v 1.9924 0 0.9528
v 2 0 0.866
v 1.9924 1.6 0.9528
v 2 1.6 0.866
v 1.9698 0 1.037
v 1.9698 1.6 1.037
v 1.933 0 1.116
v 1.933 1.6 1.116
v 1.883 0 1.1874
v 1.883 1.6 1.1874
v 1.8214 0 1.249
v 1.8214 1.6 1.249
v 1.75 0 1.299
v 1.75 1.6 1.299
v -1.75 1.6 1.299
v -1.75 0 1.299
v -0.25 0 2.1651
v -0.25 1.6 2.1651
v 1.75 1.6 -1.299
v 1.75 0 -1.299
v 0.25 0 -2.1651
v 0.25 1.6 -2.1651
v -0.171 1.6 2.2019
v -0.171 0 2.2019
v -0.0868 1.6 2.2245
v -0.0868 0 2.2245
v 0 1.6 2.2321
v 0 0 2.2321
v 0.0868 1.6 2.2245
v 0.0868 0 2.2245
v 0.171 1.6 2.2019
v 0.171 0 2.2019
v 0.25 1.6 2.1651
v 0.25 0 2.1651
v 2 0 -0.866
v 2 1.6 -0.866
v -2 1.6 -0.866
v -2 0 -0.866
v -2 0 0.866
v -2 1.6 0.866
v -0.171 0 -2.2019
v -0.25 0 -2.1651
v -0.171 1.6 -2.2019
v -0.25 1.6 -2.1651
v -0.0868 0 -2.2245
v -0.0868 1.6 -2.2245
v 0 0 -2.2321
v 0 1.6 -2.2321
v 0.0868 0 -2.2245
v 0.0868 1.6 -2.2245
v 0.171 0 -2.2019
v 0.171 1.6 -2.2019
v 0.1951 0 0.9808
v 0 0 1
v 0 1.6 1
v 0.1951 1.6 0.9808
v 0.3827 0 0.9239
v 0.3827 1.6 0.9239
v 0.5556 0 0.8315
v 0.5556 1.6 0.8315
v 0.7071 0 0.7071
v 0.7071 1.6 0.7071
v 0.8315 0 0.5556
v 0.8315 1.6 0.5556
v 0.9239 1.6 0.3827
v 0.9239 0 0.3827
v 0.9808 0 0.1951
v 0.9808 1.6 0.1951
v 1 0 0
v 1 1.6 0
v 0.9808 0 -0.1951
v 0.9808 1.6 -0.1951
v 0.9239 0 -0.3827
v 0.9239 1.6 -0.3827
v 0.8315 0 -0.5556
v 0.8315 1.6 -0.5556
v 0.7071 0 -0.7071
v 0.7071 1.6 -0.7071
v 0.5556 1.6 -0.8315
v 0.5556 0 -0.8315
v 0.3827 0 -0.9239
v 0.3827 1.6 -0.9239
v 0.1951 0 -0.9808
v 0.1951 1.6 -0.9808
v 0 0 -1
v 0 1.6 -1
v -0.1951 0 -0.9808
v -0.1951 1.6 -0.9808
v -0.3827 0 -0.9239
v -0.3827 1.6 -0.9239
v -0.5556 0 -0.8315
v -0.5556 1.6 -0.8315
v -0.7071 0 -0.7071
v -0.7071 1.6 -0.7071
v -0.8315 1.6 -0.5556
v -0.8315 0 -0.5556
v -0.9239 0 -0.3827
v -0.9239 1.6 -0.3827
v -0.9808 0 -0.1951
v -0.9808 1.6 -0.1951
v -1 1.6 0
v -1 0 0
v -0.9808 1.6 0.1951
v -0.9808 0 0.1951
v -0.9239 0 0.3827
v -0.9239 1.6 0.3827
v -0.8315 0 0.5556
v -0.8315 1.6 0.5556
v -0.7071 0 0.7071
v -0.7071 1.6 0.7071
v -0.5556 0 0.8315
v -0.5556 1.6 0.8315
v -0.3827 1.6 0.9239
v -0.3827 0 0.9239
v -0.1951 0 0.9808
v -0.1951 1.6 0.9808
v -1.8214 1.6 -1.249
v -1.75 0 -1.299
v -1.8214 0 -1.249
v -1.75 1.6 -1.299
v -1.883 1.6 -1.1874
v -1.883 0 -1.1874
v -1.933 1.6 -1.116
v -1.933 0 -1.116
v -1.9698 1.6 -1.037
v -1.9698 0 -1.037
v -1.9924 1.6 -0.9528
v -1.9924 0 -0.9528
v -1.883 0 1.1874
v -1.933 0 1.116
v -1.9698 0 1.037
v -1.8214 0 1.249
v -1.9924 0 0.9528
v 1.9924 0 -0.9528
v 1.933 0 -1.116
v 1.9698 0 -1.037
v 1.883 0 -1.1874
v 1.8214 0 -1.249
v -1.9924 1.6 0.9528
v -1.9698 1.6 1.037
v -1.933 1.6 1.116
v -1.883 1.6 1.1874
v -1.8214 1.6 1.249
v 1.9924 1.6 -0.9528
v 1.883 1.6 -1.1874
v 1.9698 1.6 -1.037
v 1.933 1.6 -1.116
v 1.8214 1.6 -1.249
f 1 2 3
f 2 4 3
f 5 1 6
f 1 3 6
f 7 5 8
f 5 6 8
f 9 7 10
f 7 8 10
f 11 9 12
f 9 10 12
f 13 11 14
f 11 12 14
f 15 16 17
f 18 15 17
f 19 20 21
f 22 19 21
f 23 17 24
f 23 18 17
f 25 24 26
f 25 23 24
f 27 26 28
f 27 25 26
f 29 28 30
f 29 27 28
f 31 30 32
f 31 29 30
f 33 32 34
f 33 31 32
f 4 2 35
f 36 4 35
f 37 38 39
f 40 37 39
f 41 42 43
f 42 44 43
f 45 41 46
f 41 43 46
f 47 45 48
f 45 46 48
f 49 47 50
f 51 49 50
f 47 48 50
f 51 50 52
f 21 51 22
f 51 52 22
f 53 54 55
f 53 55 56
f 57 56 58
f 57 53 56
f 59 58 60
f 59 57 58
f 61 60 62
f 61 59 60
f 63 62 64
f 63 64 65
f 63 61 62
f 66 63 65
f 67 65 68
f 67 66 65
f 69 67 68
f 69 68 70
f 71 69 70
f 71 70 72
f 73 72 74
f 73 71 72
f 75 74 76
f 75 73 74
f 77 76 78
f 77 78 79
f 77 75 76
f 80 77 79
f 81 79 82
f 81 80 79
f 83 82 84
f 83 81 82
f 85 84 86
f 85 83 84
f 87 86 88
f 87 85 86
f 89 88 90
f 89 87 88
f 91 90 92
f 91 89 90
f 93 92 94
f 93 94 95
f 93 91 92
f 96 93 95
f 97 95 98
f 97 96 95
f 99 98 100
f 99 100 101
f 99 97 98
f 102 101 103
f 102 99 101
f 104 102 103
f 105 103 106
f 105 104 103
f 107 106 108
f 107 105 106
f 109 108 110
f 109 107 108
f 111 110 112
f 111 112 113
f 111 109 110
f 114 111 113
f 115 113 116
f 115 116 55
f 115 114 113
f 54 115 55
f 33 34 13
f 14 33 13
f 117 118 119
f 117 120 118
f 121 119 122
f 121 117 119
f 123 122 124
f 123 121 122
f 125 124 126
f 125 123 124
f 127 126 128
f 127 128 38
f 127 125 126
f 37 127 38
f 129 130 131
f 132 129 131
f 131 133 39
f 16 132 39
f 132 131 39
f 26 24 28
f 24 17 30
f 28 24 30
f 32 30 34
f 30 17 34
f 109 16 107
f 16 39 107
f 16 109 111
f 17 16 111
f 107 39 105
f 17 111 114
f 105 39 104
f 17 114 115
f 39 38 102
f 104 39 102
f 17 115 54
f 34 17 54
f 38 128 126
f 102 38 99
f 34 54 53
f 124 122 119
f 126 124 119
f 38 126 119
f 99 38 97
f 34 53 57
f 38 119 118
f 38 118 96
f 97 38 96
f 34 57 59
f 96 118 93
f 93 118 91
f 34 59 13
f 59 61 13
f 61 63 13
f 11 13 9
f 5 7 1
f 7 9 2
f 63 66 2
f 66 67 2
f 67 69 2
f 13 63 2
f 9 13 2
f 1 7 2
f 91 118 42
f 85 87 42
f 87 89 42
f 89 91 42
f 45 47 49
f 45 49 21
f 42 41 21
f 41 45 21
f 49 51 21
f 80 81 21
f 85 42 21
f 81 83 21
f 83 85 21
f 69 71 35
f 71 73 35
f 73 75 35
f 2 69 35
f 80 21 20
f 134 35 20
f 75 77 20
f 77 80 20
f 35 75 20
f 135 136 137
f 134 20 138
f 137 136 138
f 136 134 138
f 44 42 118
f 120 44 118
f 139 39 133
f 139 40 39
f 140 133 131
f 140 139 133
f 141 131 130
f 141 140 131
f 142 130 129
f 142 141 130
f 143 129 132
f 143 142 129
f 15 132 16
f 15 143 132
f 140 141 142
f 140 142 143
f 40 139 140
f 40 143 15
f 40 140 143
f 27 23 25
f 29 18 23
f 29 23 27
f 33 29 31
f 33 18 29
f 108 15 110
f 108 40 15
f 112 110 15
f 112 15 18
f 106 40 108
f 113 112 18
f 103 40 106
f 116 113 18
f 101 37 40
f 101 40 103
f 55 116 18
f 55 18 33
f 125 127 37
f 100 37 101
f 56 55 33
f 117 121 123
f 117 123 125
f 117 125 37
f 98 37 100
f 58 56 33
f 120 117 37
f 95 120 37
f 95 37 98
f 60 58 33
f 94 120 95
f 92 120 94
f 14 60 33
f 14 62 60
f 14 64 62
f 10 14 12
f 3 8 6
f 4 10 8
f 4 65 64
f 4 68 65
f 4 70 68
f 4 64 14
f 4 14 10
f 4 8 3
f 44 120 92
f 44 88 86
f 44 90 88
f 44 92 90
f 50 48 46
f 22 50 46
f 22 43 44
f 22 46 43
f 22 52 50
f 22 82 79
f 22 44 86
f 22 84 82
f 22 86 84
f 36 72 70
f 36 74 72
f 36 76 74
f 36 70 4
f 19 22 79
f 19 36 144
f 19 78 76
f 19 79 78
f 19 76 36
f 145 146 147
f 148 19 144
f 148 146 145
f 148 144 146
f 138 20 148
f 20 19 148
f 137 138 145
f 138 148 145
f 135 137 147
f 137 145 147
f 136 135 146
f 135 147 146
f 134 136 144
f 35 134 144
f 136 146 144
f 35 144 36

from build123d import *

# Parameters (mm, degrees)
SKETCH_1_R      = 1
EXTRUDE_1_DEPTH = 1.6
FILLET_1_R      = 0.5


with BuildPart() as part:
    # 草图1 → 凸台-拉伸1 (new body)
    with BuildSketch(Plane(origin=(0, 0, 0), x_dir=(1, 0, 0), z_dir=(0, 1, 0))):
        Polygon((0, 2.309401077), (-2, 1.154700538), (-2, -1.154700538), (0, -2.309401077), (2, -1.154700538), (2, 1.154700538), align=None)
        with Locations(Location((0, 0, 0), (0, 0, 270))):
            Circle(SKETCH_1_R, mode=Mode.SUBTRACT)
    extrude(amount=EXTRUDE_1_DEPTH)

    # 圆角1
    fillet_1_edges = [part.edges().sort_by_distance(p)[0] for p in [
        (2, 0.8, -1.154700538),
        (2, 0.8, 1.154700538),
        (0, 0.8, 2.309401077),
        (-2, 0.8, 1.154700538),
        (-2, 0.8, -1.154700538),
        (0, 0.8, -2.309401077),
    ]]
    fillet(fillet_1_edges, radius=FILLET_1_R)


solid = part.part
